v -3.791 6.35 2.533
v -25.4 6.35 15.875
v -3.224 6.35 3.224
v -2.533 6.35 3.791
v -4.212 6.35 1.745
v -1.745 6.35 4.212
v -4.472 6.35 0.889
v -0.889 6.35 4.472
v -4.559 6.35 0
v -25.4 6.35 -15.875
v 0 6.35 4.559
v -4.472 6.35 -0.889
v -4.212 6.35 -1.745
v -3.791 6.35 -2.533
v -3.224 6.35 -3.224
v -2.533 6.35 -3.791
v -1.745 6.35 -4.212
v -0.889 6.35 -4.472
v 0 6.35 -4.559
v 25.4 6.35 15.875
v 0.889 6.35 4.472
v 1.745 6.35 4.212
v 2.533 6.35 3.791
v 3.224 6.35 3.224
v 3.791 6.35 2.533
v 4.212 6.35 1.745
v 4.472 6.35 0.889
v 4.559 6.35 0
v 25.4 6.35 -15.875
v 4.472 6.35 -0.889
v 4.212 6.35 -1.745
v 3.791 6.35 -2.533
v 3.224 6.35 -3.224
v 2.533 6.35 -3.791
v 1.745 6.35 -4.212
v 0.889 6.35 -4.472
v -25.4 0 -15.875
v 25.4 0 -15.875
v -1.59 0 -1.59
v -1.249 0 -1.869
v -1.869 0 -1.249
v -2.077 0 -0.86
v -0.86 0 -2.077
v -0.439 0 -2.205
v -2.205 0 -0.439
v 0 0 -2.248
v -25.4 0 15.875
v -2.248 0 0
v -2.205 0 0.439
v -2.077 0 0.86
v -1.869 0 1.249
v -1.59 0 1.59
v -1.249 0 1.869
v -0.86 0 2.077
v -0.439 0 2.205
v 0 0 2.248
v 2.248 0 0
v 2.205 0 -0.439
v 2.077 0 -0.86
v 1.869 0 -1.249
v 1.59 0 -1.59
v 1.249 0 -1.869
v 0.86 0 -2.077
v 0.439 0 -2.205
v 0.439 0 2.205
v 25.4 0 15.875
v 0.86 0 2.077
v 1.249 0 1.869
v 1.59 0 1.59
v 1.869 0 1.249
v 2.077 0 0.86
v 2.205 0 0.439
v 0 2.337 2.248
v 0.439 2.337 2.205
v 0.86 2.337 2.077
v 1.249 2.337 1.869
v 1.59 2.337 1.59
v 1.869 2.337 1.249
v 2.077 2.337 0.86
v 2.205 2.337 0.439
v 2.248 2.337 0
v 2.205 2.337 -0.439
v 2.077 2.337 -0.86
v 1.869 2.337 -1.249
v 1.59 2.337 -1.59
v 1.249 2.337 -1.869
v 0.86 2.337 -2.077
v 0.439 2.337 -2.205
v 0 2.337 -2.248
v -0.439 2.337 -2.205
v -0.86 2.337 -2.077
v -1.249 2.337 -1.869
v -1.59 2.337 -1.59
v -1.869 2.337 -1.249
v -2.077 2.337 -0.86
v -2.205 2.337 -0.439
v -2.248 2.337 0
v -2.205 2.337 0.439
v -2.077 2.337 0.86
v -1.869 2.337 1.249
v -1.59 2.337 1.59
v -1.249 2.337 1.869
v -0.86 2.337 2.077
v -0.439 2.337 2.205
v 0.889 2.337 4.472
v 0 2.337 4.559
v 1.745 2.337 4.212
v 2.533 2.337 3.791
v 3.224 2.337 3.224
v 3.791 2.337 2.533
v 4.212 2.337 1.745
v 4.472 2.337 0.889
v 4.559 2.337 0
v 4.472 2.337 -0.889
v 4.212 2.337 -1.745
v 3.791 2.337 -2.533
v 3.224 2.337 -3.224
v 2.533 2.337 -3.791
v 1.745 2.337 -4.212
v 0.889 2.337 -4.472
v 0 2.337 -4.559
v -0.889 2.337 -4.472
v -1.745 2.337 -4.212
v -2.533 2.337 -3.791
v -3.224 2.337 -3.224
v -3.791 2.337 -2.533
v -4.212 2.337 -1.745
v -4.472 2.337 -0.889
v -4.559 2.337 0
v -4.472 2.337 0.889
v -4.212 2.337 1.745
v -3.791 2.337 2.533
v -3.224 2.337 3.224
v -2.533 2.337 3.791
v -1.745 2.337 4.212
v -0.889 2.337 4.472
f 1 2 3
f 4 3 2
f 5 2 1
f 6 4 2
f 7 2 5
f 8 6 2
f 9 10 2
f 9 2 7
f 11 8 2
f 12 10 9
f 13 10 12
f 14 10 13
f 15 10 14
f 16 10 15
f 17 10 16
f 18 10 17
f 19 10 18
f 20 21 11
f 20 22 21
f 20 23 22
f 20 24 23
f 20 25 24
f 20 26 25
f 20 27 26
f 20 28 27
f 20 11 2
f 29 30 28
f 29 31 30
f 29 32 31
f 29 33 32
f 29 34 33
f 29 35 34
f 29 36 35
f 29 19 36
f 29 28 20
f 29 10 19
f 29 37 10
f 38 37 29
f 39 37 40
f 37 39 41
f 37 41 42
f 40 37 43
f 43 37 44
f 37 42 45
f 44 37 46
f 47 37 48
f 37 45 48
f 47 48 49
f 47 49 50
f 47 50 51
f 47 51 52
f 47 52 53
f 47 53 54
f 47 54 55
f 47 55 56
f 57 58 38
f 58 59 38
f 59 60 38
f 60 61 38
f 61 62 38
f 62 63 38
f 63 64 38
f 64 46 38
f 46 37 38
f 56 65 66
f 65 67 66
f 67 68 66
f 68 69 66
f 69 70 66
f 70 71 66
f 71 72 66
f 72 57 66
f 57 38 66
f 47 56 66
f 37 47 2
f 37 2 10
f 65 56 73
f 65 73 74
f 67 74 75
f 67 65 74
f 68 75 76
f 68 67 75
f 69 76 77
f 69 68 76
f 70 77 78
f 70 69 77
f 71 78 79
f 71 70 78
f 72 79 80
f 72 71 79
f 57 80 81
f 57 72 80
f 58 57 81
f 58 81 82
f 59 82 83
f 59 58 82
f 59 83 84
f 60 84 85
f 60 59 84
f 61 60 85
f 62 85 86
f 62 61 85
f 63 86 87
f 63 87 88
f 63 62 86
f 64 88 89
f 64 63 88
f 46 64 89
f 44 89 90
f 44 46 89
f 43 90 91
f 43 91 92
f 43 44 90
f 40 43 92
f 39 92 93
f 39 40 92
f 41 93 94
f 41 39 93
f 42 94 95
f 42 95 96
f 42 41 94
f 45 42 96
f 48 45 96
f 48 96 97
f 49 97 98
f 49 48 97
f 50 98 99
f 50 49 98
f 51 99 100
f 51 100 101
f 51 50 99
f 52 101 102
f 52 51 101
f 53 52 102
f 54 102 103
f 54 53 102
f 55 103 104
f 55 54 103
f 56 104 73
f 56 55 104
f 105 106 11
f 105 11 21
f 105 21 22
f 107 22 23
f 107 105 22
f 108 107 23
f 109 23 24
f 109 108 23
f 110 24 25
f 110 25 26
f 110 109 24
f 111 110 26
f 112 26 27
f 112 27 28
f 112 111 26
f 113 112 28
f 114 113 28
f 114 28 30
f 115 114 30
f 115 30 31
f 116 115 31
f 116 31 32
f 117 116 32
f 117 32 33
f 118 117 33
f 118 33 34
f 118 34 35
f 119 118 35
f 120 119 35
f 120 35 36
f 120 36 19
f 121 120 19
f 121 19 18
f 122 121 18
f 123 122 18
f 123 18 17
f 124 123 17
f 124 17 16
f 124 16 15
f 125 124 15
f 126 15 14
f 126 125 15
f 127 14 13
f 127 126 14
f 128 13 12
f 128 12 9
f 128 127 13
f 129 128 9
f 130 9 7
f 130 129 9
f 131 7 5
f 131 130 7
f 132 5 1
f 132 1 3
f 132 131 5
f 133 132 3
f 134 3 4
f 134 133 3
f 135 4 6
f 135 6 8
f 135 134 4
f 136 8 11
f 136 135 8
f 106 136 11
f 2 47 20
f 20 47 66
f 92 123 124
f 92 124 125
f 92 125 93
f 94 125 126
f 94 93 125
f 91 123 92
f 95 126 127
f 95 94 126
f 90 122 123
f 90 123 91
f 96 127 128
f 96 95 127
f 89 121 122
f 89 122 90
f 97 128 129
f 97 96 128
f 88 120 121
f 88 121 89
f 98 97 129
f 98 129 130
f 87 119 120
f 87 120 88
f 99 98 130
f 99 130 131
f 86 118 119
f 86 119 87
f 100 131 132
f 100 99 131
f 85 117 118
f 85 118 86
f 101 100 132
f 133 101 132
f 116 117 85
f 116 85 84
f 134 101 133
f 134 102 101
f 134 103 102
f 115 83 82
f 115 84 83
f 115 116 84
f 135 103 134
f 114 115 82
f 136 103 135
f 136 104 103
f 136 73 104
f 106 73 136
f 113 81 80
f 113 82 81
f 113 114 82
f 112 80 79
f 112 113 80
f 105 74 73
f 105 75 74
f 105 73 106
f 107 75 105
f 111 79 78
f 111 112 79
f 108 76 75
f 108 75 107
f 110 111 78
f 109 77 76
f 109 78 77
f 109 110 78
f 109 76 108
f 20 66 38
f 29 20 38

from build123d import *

# Parameters (mm, degrees)
SKETCH1_W           = 50.8
SKETCH1_H           = 31.75
SKETCH1_R           = 4.5593
BOSS_EXTRUDE1_DEPTH = 6.35
SKETCH1_3_R         = 4.5593
SKETCH1_3_R_2       = 2.2479
BOSS_EXTRUDE2_DEPTH = 2.3368


with BuildPart() as part:
    # Sketch1 → Boss-Extrude1 (new body)
    with BuildSketch(Plane(origin=(0, 0, 0), x_dir=(1, 0, 0), z_dir=(0, 1, 0))):
        Rectangle(SKETCH1_W, SKETCH1_H)
        Circle(SKETCH1_R, mode=Mode.SUBTRACT)
    extrude(amount=BOSS_EXTRUDE1_DEPTH)

    # Sketch1<3> → Boss-Extrude2 (add)
    with BuildSketch(Plane(origin=(0, 0, 0), x_dir=(1, 0, 0), z_dir=(0, 1, 0))):
        Circle(SKETCH1_3_R)
        Circle(SKETCH1_3_R_2, mode=Mode.SUBTRACT)
    extrude(amount=BOSS_EXTRUDE2_DEPTH)


solid = part.part
